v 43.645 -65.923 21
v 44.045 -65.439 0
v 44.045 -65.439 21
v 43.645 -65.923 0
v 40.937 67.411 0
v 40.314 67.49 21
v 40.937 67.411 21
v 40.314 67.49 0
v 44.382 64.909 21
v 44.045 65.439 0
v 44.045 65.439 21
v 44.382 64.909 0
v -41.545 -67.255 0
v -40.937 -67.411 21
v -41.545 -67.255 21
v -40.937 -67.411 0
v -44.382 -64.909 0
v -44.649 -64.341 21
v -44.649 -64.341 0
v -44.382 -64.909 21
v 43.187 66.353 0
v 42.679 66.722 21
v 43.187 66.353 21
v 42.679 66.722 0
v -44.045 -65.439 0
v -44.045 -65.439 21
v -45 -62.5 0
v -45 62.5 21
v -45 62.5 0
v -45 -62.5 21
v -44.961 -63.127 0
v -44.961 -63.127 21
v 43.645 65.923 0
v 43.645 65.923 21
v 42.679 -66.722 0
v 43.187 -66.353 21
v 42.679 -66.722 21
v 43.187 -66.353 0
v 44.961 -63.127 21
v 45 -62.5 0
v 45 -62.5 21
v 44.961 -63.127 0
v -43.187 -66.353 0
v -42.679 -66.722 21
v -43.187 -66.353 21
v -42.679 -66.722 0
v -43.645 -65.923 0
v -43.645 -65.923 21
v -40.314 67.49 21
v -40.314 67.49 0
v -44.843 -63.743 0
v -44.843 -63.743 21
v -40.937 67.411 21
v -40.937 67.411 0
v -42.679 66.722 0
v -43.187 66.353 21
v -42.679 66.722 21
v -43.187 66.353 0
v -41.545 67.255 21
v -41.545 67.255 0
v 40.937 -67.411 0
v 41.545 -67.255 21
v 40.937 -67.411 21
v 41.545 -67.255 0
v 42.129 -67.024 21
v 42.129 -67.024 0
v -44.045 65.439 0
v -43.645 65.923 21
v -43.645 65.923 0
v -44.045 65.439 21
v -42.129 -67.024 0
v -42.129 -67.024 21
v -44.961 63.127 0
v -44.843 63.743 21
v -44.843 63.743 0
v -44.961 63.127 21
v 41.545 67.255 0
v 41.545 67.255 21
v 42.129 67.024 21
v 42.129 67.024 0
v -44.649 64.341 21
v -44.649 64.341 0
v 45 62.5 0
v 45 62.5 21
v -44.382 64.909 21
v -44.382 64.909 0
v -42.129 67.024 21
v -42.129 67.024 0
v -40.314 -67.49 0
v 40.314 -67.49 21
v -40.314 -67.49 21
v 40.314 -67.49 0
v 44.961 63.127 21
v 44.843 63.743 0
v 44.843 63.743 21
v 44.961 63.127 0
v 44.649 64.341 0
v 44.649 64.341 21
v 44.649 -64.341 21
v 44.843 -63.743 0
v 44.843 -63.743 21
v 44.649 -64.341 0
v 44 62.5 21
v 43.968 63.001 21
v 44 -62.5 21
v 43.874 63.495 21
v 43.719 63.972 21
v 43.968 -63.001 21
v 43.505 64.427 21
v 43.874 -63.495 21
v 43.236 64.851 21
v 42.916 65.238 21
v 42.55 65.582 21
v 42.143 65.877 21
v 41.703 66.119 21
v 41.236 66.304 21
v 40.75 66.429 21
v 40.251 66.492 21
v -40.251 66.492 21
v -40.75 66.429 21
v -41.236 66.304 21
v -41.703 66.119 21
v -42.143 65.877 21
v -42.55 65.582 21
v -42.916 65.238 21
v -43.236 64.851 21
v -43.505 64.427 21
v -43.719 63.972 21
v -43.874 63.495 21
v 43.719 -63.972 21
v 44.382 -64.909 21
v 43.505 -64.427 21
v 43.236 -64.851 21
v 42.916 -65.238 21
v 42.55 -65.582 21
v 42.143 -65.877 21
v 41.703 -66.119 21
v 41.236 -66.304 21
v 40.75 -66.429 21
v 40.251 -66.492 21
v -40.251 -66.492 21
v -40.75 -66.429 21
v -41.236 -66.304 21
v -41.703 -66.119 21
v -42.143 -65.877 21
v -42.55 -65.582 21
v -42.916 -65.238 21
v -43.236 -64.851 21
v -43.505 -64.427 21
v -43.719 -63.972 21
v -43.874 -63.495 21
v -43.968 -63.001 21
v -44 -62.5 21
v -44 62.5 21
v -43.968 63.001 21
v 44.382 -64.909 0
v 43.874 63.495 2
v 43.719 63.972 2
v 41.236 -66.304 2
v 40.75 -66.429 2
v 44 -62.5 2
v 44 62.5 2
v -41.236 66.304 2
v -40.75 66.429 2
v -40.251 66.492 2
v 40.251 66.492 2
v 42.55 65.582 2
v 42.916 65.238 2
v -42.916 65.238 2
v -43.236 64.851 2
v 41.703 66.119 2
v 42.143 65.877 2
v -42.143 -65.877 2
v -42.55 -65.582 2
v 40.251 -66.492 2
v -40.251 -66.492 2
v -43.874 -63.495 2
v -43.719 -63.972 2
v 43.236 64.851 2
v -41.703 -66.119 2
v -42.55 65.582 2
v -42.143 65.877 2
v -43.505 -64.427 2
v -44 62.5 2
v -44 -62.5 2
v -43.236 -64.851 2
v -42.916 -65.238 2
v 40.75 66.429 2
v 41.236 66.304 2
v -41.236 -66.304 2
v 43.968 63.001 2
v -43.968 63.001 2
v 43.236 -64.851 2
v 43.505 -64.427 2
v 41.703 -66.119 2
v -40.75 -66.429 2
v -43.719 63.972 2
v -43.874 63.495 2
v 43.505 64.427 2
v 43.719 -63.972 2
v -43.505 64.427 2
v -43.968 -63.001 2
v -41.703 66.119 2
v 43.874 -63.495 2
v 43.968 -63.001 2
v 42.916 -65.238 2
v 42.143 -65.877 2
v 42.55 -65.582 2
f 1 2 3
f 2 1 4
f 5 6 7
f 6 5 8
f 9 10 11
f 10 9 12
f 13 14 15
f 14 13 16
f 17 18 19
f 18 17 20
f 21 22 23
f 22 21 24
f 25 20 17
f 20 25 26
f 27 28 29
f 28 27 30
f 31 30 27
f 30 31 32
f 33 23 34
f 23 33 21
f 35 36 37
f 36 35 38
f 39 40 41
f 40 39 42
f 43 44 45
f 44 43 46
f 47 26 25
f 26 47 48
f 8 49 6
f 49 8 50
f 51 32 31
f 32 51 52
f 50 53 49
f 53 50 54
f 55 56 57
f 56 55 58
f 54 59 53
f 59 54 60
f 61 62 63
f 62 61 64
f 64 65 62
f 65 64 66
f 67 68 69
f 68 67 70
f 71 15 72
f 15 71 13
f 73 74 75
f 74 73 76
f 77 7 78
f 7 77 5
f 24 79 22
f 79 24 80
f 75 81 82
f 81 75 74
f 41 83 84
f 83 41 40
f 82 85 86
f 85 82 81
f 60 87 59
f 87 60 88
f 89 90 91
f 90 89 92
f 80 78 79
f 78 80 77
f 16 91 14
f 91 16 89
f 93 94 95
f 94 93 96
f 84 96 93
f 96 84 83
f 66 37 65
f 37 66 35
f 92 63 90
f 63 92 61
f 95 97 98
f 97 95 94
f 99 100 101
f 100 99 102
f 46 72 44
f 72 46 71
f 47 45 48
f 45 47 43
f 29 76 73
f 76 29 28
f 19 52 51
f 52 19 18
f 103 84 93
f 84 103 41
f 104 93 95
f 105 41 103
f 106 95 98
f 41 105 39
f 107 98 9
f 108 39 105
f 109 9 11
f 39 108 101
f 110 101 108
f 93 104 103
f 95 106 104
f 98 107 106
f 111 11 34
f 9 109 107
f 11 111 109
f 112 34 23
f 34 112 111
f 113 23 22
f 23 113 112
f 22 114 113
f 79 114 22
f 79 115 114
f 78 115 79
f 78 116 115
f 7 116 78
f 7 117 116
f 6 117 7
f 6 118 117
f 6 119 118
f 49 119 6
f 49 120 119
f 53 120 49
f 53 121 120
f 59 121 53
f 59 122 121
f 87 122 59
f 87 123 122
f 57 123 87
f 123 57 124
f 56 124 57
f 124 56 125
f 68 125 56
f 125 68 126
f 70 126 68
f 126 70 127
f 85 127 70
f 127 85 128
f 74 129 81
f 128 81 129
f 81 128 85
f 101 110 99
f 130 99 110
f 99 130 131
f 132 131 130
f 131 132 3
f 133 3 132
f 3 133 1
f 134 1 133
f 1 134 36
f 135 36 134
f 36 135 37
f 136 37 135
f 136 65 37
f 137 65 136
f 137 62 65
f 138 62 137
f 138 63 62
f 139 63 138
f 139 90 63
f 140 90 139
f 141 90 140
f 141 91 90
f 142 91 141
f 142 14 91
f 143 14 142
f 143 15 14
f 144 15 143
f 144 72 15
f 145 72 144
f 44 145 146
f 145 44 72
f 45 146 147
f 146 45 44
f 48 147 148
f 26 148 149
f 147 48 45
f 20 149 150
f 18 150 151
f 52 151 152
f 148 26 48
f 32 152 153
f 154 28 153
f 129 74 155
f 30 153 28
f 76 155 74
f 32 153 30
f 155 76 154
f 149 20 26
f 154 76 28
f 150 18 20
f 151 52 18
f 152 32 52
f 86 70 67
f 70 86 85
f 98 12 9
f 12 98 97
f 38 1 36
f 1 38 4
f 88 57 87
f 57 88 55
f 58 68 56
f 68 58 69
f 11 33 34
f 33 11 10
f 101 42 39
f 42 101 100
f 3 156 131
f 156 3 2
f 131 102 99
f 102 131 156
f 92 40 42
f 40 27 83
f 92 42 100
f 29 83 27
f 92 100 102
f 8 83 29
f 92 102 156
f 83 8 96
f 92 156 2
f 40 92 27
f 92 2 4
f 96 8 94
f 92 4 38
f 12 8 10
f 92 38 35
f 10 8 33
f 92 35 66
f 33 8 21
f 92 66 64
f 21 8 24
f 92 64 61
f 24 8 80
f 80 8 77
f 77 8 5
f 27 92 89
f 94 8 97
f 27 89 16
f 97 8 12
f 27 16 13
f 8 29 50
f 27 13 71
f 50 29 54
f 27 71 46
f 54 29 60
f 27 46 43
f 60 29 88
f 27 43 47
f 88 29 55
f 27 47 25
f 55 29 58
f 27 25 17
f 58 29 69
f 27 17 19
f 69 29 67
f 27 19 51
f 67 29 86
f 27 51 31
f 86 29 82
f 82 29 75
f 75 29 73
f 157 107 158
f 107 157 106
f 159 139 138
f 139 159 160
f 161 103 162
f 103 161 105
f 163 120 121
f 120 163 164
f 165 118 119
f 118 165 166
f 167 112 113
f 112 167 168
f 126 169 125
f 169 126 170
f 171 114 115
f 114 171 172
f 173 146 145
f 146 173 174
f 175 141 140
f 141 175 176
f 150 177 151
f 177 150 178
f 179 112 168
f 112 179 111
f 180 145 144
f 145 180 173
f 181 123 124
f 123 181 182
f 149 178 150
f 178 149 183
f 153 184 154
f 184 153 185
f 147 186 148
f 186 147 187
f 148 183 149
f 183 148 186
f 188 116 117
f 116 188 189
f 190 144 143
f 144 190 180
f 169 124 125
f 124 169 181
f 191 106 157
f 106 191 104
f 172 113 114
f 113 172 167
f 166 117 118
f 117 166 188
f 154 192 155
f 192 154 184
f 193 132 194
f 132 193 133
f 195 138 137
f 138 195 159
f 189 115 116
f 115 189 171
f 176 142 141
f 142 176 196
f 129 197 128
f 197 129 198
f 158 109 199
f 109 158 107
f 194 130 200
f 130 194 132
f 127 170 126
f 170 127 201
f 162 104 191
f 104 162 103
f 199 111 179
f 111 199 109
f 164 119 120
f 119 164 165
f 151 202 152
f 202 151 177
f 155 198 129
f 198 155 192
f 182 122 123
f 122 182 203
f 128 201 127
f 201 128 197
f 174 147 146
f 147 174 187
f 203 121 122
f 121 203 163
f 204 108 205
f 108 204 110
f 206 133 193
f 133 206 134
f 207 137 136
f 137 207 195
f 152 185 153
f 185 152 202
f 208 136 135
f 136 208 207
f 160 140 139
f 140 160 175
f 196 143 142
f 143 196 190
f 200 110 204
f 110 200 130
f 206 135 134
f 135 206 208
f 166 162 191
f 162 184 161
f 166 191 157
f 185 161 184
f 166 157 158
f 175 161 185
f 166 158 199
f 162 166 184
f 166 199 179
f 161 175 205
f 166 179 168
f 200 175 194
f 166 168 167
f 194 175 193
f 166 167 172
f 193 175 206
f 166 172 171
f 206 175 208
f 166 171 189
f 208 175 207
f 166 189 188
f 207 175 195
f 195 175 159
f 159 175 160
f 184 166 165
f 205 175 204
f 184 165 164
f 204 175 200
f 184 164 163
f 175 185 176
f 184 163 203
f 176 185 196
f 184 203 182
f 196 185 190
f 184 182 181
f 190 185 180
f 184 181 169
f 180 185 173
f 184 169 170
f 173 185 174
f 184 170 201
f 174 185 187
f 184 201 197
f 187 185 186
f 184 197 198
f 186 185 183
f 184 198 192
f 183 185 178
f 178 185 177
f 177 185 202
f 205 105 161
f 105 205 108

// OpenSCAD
$fn = 50;


difference() {
	union() {
		hull() {
			translate(v = [-40.0000000000, 62.5000000000, 0]) {
				cylinder(h = 21, r = 5);
			}
			translate(v = [40.0000000000, 62.5000000000, 0]) {
				cylinder(h = 21, r = 5);
			}
			translate(v = [-40.0000000000, -62.5000000000, 0]) {
				cylinder(h = 21, r = 5);
			}
			translate(v = [40.0000000000, -62.5000000000, 0]) {
				cylinder(h = 21, r = 5);
			}
		}
	}
	union() {
		translate(v = [0, 0, 2]) {
			hull() {
				translate(v = [-40.0000000000, 62.5000000000, 0]) {
					cylinder(h = 19, r = 4);
				}
				translate(v = [40.0000000000, 62.5000000000, 0]) {
					cylinder(h = 19, r = 4);
				}
				translate(v = [-40.0000000000, -62.5000000000, 0]) {
					cylinder(h = 19, r = 4);
				}
				translate(v = [40.0000000000, -62.5000000000, 0]) {
					cylinder(h = 19, r = 4);
				}
			}
		}
	}
}
